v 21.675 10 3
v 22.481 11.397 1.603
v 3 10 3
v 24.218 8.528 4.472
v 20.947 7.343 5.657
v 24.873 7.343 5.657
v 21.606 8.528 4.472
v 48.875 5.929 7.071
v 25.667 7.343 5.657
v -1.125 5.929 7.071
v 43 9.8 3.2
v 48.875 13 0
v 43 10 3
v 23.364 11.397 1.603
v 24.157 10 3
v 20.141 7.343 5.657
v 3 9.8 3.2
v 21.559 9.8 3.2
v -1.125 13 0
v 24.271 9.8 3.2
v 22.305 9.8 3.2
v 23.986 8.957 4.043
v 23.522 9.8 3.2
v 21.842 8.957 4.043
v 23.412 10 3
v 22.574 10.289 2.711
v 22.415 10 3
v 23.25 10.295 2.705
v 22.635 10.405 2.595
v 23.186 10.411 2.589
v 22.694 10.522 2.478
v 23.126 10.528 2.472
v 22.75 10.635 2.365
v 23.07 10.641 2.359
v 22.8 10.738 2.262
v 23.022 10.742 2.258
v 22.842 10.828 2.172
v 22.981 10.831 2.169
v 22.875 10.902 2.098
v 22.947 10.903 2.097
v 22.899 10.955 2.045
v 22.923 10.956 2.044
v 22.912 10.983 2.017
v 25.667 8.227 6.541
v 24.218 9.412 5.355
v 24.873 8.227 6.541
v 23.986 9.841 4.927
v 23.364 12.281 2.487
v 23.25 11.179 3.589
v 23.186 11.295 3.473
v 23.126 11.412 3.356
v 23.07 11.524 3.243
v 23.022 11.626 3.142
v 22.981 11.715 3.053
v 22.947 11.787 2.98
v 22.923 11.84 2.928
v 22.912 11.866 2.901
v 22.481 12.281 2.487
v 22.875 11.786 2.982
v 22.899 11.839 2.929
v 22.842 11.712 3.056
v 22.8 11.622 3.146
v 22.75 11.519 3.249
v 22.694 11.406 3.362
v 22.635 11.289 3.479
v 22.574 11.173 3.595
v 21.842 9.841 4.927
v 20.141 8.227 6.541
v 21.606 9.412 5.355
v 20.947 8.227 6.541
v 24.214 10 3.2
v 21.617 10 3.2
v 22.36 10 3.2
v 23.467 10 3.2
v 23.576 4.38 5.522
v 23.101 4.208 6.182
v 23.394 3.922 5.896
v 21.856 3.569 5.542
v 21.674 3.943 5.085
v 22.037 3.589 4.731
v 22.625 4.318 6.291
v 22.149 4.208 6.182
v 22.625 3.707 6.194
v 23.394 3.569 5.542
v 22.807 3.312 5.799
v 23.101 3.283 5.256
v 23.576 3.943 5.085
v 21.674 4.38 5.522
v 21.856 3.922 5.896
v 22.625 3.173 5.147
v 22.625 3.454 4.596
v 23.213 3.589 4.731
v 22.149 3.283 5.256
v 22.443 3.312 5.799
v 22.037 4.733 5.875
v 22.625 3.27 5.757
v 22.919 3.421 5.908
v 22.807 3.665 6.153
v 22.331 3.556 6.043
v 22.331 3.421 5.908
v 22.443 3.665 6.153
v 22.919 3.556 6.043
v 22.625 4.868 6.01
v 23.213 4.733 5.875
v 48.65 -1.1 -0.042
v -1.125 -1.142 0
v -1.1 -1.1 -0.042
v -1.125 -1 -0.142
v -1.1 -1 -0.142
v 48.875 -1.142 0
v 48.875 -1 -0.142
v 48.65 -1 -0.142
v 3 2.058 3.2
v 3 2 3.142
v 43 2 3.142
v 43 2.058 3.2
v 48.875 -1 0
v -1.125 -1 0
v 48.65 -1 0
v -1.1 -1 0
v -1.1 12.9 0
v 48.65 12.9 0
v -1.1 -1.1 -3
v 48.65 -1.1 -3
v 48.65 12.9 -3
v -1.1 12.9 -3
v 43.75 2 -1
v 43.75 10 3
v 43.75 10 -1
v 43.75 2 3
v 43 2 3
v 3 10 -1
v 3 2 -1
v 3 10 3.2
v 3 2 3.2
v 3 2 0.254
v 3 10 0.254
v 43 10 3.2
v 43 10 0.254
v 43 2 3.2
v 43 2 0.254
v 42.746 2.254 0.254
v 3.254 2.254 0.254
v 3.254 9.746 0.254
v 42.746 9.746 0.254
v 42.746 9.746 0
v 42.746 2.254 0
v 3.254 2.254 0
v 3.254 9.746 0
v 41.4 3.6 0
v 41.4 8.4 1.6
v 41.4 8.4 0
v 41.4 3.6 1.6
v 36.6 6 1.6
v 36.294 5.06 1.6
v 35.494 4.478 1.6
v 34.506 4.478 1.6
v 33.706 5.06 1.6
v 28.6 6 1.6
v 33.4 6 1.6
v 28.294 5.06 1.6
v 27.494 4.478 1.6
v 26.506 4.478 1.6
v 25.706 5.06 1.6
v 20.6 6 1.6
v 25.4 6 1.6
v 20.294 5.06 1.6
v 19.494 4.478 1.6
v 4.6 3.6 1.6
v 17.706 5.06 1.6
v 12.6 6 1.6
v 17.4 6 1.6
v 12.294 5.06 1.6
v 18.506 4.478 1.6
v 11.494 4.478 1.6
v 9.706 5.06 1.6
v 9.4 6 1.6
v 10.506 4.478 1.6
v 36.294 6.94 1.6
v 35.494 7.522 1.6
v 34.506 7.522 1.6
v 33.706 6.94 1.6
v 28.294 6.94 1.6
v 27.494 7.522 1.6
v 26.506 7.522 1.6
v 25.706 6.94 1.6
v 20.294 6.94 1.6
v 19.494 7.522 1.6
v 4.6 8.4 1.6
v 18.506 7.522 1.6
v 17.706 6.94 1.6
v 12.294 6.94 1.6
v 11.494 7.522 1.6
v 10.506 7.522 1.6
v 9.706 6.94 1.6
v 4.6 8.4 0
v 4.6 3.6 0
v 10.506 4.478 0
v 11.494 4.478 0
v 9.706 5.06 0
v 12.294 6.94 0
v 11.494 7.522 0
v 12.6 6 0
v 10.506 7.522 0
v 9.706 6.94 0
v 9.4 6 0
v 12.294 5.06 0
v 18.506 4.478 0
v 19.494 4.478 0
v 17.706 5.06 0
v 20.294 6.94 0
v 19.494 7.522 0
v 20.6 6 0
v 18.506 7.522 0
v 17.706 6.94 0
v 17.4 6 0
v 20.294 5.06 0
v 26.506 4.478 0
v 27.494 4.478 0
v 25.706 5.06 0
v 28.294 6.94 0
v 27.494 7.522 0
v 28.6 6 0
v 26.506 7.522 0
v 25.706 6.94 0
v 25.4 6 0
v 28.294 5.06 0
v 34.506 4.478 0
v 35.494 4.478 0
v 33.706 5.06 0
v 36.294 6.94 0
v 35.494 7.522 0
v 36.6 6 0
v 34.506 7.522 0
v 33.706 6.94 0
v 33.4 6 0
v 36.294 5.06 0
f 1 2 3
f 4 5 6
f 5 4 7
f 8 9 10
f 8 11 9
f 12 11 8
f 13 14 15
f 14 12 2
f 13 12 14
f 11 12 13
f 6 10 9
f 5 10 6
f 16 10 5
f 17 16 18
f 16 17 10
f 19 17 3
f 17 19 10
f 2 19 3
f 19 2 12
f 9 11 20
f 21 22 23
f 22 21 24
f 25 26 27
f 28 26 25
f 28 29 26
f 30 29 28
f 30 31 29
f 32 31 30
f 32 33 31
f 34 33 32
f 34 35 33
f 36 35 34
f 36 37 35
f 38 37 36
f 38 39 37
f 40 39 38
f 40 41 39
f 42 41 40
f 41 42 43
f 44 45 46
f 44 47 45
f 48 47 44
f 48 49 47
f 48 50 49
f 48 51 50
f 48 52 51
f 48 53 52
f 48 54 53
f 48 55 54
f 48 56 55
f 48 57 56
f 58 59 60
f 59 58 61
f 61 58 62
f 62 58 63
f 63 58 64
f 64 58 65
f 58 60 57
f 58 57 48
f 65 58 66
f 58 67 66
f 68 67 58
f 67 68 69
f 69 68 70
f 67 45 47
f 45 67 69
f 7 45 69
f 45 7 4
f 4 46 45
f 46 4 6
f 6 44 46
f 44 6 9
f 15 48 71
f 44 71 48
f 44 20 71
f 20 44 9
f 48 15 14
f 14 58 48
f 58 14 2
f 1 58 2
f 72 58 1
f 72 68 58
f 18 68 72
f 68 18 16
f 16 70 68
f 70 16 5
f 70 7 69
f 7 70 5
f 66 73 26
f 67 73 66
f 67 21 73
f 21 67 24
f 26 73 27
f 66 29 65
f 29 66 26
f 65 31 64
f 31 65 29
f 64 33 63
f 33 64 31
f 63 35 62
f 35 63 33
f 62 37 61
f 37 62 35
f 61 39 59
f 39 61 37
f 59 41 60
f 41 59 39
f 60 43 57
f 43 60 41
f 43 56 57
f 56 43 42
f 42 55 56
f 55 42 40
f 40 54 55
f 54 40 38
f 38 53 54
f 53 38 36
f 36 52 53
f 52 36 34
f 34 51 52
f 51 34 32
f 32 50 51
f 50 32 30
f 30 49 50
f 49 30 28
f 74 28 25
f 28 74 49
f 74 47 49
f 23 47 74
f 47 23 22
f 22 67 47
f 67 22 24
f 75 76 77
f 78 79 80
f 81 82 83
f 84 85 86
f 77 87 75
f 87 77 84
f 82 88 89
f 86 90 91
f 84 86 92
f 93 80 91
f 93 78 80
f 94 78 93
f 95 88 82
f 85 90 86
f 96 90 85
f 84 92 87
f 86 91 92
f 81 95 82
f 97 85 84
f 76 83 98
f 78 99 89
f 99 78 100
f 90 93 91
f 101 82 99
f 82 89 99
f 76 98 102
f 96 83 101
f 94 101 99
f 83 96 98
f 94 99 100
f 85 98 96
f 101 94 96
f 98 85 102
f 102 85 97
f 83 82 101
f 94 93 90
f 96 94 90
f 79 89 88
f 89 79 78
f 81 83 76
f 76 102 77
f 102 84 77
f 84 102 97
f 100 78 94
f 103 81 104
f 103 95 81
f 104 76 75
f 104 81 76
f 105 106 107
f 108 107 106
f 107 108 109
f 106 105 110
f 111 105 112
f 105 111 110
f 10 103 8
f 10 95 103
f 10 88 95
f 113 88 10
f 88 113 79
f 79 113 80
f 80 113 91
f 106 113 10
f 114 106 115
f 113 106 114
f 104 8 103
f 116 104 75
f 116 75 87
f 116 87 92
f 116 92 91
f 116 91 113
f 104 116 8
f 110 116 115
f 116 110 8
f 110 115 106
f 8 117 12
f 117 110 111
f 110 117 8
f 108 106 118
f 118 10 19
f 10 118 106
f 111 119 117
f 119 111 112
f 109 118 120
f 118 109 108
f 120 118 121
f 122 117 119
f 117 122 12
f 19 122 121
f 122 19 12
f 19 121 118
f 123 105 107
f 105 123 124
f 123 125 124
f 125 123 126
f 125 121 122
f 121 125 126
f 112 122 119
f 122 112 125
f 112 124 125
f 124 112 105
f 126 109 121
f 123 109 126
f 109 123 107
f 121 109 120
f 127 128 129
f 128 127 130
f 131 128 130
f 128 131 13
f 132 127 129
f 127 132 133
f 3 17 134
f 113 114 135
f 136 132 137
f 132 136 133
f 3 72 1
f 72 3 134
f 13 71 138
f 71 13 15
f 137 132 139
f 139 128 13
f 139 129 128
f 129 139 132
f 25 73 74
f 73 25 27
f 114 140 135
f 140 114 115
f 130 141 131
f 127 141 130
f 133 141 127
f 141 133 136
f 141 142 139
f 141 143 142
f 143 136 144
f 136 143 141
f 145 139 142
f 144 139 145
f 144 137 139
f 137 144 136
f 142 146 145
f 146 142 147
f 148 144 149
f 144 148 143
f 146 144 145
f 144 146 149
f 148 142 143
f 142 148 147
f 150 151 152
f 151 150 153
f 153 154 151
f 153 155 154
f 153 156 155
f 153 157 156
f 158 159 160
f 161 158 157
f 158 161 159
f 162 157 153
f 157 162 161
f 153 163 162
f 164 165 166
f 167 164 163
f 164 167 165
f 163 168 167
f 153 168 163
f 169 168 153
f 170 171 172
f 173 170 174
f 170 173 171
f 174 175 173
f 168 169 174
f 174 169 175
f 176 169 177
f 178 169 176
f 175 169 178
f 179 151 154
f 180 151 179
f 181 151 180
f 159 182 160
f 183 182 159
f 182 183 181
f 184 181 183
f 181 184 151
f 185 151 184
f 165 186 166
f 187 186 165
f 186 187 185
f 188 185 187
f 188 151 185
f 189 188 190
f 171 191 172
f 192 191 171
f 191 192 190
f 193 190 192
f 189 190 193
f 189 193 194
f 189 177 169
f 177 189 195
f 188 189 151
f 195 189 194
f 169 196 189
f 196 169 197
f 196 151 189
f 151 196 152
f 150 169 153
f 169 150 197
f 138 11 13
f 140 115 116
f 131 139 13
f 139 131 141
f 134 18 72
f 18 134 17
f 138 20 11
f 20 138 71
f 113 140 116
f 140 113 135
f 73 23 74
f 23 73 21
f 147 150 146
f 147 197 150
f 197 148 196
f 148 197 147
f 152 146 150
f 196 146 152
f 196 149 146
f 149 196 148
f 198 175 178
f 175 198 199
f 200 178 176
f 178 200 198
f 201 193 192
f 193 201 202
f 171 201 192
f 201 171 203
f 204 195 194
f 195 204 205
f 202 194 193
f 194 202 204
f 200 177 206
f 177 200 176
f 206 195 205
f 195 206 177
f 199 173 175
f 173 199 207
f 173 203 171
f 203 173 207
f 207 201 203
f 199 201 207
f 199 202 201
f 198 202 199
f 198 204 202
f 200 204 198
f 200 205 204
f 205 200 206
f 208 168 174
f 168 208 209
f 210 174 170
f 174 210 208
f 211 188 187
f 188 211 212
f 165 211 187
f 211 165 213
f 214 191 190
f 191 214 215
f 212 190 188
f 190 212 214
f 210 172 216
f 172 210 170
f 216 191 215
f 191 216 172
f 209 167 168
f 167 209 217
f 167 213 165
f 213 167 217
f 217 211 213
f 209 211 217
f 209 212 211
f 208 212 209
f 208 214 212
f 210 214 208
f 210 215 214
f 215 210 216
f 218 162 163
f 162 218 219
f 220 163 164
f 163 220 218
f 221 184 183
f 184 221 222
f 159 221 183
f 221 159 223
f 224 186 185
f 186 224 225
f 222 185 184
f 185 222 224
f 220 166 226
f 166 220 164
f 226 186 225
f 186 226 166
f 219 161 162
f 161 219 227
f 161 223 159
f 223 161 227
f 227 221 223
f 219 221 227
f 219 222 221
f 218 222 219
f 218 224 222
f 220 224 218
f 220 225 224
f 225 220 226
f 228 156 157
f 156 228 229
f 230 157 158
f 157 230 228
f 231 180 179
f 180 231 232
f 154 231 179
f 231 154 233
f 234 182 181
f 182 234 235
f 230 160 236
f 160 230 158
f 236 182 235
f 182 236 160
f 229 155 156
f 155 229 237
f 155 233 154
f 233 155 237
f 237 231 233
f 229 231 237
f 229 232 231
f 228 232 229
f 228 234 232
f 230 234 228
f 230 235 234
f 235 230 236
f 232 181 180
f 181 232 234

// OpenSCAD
// file: ../OpenSCAD/brailleAndText.scad
/*
Braille Module
http://creativecommons.org/licenses/by/3.0/
*/


// mm sizes from http://dots.physics.orst.edu/gs_layout.html
radius = 0.25;
spacing = 2.5;
startOffset = 3.75;
distance = startOffset + spacing;

plate_height = 10;
plate_thickness = 10;   // was 2.

$fn = 10;



module letter(bitmap, char) {
//    echo(char);
	row_size = 2;
	col_size = 3;
	bitmap_size = row_size * col_size;
	
	function loc_x(loc) = floor(loc / row_size) * spacing + spacing;
	function loc_y(loc) = loc % row_size * spacing  + (distance-spacing)/2;

    translate([0, loc_y(-1), -2]) {
        rotate([270, 0, 90]) {
            linear_extrude(height = 1.25)
            text(char, 6);
        }
    }
	
    for (loc = [0:bitmap_size - 1]) {
		if (bitmap[loc] != 0) {
			union() {
				translate(v = [loc_x(loc), loc_y(loc), 0]) {
					sphere(radius = radius* bitmap[loc], center = true);
				}
			}
		}
	}
}


module braille_char(char) {
	if (char == "A" || char == "a") {
		letter([
			1,0,
			0,0,
			0,0
		], char);
	} else if (char == "B" || char == "b") {
		letter([
			1,0,
			1,0,
			0,0
		], char);
	} else if (char == "C" || char == "c") {
		letter([
			1,1,
			0,0,
			0,0
		], char);
	} else if (char == "D" || char == "d") {
		letter([
			1,1,
			0,1,
			0,0
		], char);
	} else if (char == "E" || char == "e") {
		letter([
			1,0,
			0,1,
			0,0
		], char);
	} else if (char == "F" || char == "f") {
		letter([
			1,1,
			1,0,
			0,0
		], char);
	} else if (char == "G" || char == "g") {
		letter([
			1,1,
			1,1,
			0,0
		], char);
	} else if (char == "H" || char == "h") {
		letter([
			1,0,
			1,1,
			0,0
		], char);
	} else if (char == "I" || char == "i") {
		letter([
			0,1,
			1,0,
			0,0
		], char);
	} else if (char == "J" || char == "j") {
		letter([
			0,1,
			1,1,
			0,0
		], char);
	} else if (char == "K" || char == "k") {
		letter([
			1,0,
			0,0,
			1,0
		], char);
	} else if (char == "L" || char == "l") {
		letter([
			1,0,
			1,0,
			1,0
		], char);
	} else if (char == "M" || char == "m") {
		letter([
			1,1,
			0,0,
			1,0
		], char);
	} else if (char == "N" || char == "n") {
		letter([
			1,1,
			0,1,
			1,0
		], char);
	} else if (char == "O" || char == "o") {
		letter([
			1,0,
			0,1,
			1,0
		], char);
	} else if (char == "P" || char == "p") {
		letter([
			1,1,
			1,0,
			1,0
		], char);
	} else if (char == "Q" || char == "q") {
		letter([
			1,1,
			1,1,
			1,0
		], char);
	} else if (char == "R" || char == "r") {
		letter([
			1,0,
			1,1,
			1,0
		], char);
	} else if (char == "S" || char == "s") {
		letter([
			0,1,
			1,0,
			1,0
		], char);
	} else if (char == "T" || char == "t") {
		letter([
			0,1,
			1,1,
			1,0
		], char);
	} else if (char == "U" || char == "u") {
		letter([
			1,0,
			0,0,
			1,1
		], char);
	} else if (char == "V" || char == "v") {
		letter([
			1,0,
			1,1,
			1,0
		], char);
	} else if (char == "W" || char == "w") {
		letter([
			0,1,
			1,1,
			0,1
		], char);
	} else if (char == "X" || char == "x") {
		letter([
			1,1,
			0,0,
			1,1
		], char);
	} else if (char == "Y" || char == "y") {
		letter([
			1,1,
			0,1,
			1,1
		], char);
	} else if (char == "Z" || char == "z") {
		letter([
			1,0,
			0,1,
			1,1
		], char);
    } else if (char == " ") {
		letter([
			0,0,
			0,0,
			0,0
		], char);
	} else {
		echo("Invalid Character: ", char);
	}

}

module braille_str(chars) {
    char_count = len(chars);
	echo(str("Total Width of ", chars, " : ",  distance * char_count, "mm"));
	union() {
		for (count = [0:char_count-1]) {
			translate(v = [0, count * distance, plate_thickness]) {
				braille_char(chars[count]);
			}
		}
		translate(v = [0, -distance/2, 0]) {
			color([0,0,1]) {
				cube(size = [plate_height, distance * (char_count+1), plate_thickness]);
			}
            }                                                      
	}
}

function lenText(txt="Hi") = distance * len(txt);

module printTextAndBraille(textToPrint) {
    blockLen = lenText(textToPrint);
    union()
    {
        difference() {                      // remove second box from first
            rotate([0,45,0]) {              // make it on its edge
                braille_str((textToPrint)); // make a long box
            }
            translate([0, -3.25, -8]) {     // move in right place
                cube(size = [14, (blockLen+8), 8]);
            }
        } 
        translate([0.1, -3.1, -3]) {     // move in right place
            cube(size = [14, (blockLen+6), 3]); 
        }
    }                                 
}

printTextAndBraille("HELLO CalLUM");
// file: ../openSCADLibs/lego_brick_builder.scad
/*

 Basic Lego brick builder module for OpenScad by Jorg Janssen 2013 (CC BY-NC 3.0) 
 To use this in your own projects add:

 use <path_to_this_file/lego_brick_builder.scad>
 brick (length, width, height [,smooth]);

 Length and width are in standard lego brick dimensions. 
 Height is in flat brick heights, so for a normal lego brick height = 3.
 Add optional smooth = true for a brick without studs. 
 Use height = 0 to just put studs/knobs on top of other things.

 */
$fn = 150;

// and this is how it's done:

FLU = 1.6; // Fundamental Lego Unit = 1.6 mm

BRICK_WIDTH = 5*FLU; // basic brick width
BRICK_HEIGHT = 6*FLU; // basic brick height
PLATE_HEIGHT = 2*FLU; // basic plate height
WALL_THICKNESS = FLU; // outer wall of the brick
STUD_RADIUS = 1.5*FLU; // studs are the small cylinders on top of the brick with the lego logo ('nopje' in Dutch)
STUD_HEIGHT = FLU; 
ANTI_STUD_RADIUS = 0.5*4.07*FLU;  // an anti stud is the hollow cylinder inside bricks that have length > 1 and width > 1
PIN_RADIUS = FLU; // a pin is the small cylinder inside bricks that have length = 1 or width = 1
SUPPORT_THICKNESS = 0.254; // support is the thin surface between anti studs, pins and walls, your printer might not print this thin, try thicker!
EDGE = 0.254; // this is the width and height of the bottom line edge of smooth bricks
CORRECTION = 0.1; // addition to each size, to make sure all parts connect by moving them a little inside each other

module brick(length = 4, width = 2, height = 3, smooth = false){

	// brick shell
	difference(){
		cube(size = [length*BRICK_WIDTH,width*BRICK_WIDTH,height*PLATE_HEIGHT]);
		translate([WALL_THICKNESS,WALL_THICKNESS,-WALL_THICKNESS])
		union(){
			cube(size = [length*BRICK_WIDTH-2*WALL_THICKNESS,width*BRICK_WIDTH-2*WALL_THICKNESS,height*PLATE_HEIGHT]);
			// stud inner holes, radius = pin radius
			if (!smooth) {
				translate([STUD_RADIUS+WALL_THICKNESS,STUD_RADIUS+WALL_THICKNESS,height*PLATE_HEIGHT])
				for (y = [0:width-1]){
					for (x = [0:length-1]){
						translate ([x*BRICK_WIDTH-WALL_THICKNESS,y*BRICK_WIDTH-WALL_THICKNESS,-CORRECTION])
						cylinder(h=WALL_THICKNESS+2*CORRECTION,r=PIN_RADIUS);
					}
				}
			}
			// small bottom line edge for smooth bricks
			else {
				translate([-WALL_THICKNESS-CORRECTION,-WALL_THICKNESS-CORRECTION,FLU-CORRECTION]) 
				difference() {
					cube([length*BRICK_WIDTH+2*CORRECTION,width*BRICK_WIDTH+2*CORRECTION,EDGE+CORRECTION]);
					translate([EDGE+CORRECTION,EDGE+CORRECTION,-CORRECTION])
					cube([length*BRICK_WIDTH-2*EDGE,width*BRICK_WIDTH-2*EDGE,EDGE+3*CORRECTION]); 
				}
			}
		}
	}
	// Studs
	if(!smooth){
		translate([STUD_RADIUS+WALL_THICKNESS,STUD_RADIUS+WALL_THICKNESS,height*PLATE_HEIGHT])
		for (y = [0:width-1]){
			for (x = [0:length-1]){
				translate ([x*BRICK_WIDTH,y*BRICK_WIDTH,-CORRECTION])
				difference(){
					cylinder(h=STUD_HEIGHT+CORRECTION, r=STUD_RADIUS);
					// Stud inner holes
					translate([0,0,-CORRECTION])
					cylinder(h=0.5*STUD_HEIGHT+CORRECTION,r=PIN_RADIUS);
				}
				// tech logo - disable this if your printer isn't capable of printing this small
				if ( length > width){
					translate([x*BRICK_WIDTH+0.8,y*BRICK_WIDTH-1.9,STUD_HEIGHT-CORRECTION])
					resize([1.2*1.7,2.2*1.7,0.254+CORRECTION])
					rotate(a=[0,0,90])
					import("tech.stl");
				}
				else {
					translate([x*BRICK_WIDTH-1.9,y*BRICK_WIDTH-0.8,STUD_HEIGHT-CORRECTION])
					resize([2.2*1.7,1.2*1.7,0.254+CORRECTION])
					import("tech.stl");				
				}				
				/* 
				// Alternative 2-square logo
				translate ([x*BRICK_WIDTH+CORRECTION,y*BRICK_WIDTH-CORRECTION,STUD_HEIGHT-CORRECTION])		
				cube([1,1,2*CORRECTION]);
				translate ([x*BRICK_WIDTH-0.9,y*BRICK_WIDTH-0.9,STUD_HEIGHT-CORRECTION])		
				cube([1,1,0.3]);
				*/				
			}
		}
	}
	// Pins x
	if (width == 1 && length > 1) {	
			for (x = [1:length-1]){
				translate([x*BRICK_WIDTH,0.5*BRICK_WIDTH,0])
				cylinder(h=height*PLATE_HEIGHT-WALL_THICKNESS+CORRECTION,r=PIN_RADIUS);
				// Supports
				if (height > 1) {
				translate([x*BRICK_WIDTH-0.5*SUPPORT_THICKNESS,CORRECTION,STUD_HEIGHT])
				cube(size=[SUPPORT_THICKNESS,BRICK_WIDTH-2*CORRECTION,height*PLATE_HEIGHT-STUD_HEIGHT-WALL_THICKNESS+CORRECTION]);
			}
		}
	}
	// Pins y
	if (length == 1 && width > 1) {	
			for (y = [1:width-1]){
			translate([0.5*BRICK_WIDTH,y*BRICK_WIDTH,0])
			cylinder(h=height*PLATE_HEIGHT-WALL_THICKNESS+CORRECTION,r=PIN_RADIUS);
			// Supports
			if (height > 1) {
			translate([CORRECTION,y*BRICK_WIDTH-0.5*SUPPORT_THICKNESS,STUD_HEIGHT])
			cube(size=[BRICK_WIDTH-2*CORRECTION,SUPPORT_THICKNESS,height*PLATE_HEIGHT-STUD_HEIGHT-WALL_THICKNESS+CORRECTION]);}
			
		}
	}
	// Anti Studs
	if (width > 1 && length > 1){
		difference(){
			union(){
				for(y = [1:width-1]){
					for(x = [1:length-1]){
						// anti studs
						translate([x*BRICK_WIDTH,y*BRICK_WIDTH,0])
						cylinder (h=height*PLATE_HEIGHT-WALL_THICKNESS+CORRECTION, r = ANTI_STUD_RADIUS);
						// Supports
						if (height > 1){
							// Support x
							if (x%2 == 0 && (length%2 == 0 || length%4 == 1 && x<length/2 || length%4 == 3 && x>length/2) || x%2 == 1 && (length%4 == 3 && x<length/2 || length%4 == 1 && x>length/2)) {
								translate([BRICK_WIDTH*x-0.5*SUPPORT_THICKNESS,y*BRICK_WIDTH-BRICK_WIDTH+WALL_THICKNESS-CORRECTION,STUD_HEIGHT])
								cube(size=[SUPPORT_THICKNESS,2*BRICK_WIDTH-2*WALL_THICKNESS,height*PLATE_HEIGHT-STUD_HEIGHT-WALL_THICKNESS+CORRECTION]);
							}
							// Supports y							
							if (y%2 == 0 && (width%2 == 0 || width%4 == 1 && y<width/2 || width%4 == 3 && y>width/2) || y%2 == 1 && (width%4 == 3 && y<width/2 || width%4 == 1 && y>width/2)) {
								translate([x*BRICK_WIDTH-BRICK_WIDTH+WALL_THICKNESS-CORRECTION,BRICK_WIDTH*y-0.5*SUPPORT_THICKNESS,STUD_HEIGHT])
								cube(size=[2*BRICK_WIDTH-2*WALL_THICKNESS,SUPPORT_THICKNESS,height*PLATE_HEIGHT-STUD_HEIGHT-WALL_THICKNESS+CORRECTION]);
							}
						}
					}
				}
			}
			union(){
				for(y = [1:width-1]){
					for(x = [1:length-1]){
						// hollow anti studs
						translate([x*BRICK_WIDTH,y*BRICK_WIDTH,-WALL_THICKNESS])
						cylinder (h=height*PLATE_HEIGHT, r = STUD_RADIUS);				
					}
				}
			}
		}		
	}
}
	
// file: ../OpenSCAD/TextAndBrailleLegoBlock.scad
 include <../openSCADLibs/lego_brick_builder.scad>
 include <../OpenSCAD/brailleAndText.scad>;

module brickAndText(text) {
    txtLen = distance * len(text);
    echo(distance);
    difference() {
        rotate([180,180,90])
            translate([-13, 2, 0])
                printTextAndBraille(text);
        translate([3, 2, -1]) 
            cube([txtLen - 3, BRICK_WIDTH, 4]);
    }
    translate([3,2,0])
        brick(floor(txtLen / BRICK_WIDTH),1,1, true);    
}

// use <../BPNodesV2/TextNBraille.scad>
//brickAndText("This is a test string");  
// main file
use <../OpenSCAD/TextAndBrailleLegoBlock.scad>

brickAndText("   A   ");
